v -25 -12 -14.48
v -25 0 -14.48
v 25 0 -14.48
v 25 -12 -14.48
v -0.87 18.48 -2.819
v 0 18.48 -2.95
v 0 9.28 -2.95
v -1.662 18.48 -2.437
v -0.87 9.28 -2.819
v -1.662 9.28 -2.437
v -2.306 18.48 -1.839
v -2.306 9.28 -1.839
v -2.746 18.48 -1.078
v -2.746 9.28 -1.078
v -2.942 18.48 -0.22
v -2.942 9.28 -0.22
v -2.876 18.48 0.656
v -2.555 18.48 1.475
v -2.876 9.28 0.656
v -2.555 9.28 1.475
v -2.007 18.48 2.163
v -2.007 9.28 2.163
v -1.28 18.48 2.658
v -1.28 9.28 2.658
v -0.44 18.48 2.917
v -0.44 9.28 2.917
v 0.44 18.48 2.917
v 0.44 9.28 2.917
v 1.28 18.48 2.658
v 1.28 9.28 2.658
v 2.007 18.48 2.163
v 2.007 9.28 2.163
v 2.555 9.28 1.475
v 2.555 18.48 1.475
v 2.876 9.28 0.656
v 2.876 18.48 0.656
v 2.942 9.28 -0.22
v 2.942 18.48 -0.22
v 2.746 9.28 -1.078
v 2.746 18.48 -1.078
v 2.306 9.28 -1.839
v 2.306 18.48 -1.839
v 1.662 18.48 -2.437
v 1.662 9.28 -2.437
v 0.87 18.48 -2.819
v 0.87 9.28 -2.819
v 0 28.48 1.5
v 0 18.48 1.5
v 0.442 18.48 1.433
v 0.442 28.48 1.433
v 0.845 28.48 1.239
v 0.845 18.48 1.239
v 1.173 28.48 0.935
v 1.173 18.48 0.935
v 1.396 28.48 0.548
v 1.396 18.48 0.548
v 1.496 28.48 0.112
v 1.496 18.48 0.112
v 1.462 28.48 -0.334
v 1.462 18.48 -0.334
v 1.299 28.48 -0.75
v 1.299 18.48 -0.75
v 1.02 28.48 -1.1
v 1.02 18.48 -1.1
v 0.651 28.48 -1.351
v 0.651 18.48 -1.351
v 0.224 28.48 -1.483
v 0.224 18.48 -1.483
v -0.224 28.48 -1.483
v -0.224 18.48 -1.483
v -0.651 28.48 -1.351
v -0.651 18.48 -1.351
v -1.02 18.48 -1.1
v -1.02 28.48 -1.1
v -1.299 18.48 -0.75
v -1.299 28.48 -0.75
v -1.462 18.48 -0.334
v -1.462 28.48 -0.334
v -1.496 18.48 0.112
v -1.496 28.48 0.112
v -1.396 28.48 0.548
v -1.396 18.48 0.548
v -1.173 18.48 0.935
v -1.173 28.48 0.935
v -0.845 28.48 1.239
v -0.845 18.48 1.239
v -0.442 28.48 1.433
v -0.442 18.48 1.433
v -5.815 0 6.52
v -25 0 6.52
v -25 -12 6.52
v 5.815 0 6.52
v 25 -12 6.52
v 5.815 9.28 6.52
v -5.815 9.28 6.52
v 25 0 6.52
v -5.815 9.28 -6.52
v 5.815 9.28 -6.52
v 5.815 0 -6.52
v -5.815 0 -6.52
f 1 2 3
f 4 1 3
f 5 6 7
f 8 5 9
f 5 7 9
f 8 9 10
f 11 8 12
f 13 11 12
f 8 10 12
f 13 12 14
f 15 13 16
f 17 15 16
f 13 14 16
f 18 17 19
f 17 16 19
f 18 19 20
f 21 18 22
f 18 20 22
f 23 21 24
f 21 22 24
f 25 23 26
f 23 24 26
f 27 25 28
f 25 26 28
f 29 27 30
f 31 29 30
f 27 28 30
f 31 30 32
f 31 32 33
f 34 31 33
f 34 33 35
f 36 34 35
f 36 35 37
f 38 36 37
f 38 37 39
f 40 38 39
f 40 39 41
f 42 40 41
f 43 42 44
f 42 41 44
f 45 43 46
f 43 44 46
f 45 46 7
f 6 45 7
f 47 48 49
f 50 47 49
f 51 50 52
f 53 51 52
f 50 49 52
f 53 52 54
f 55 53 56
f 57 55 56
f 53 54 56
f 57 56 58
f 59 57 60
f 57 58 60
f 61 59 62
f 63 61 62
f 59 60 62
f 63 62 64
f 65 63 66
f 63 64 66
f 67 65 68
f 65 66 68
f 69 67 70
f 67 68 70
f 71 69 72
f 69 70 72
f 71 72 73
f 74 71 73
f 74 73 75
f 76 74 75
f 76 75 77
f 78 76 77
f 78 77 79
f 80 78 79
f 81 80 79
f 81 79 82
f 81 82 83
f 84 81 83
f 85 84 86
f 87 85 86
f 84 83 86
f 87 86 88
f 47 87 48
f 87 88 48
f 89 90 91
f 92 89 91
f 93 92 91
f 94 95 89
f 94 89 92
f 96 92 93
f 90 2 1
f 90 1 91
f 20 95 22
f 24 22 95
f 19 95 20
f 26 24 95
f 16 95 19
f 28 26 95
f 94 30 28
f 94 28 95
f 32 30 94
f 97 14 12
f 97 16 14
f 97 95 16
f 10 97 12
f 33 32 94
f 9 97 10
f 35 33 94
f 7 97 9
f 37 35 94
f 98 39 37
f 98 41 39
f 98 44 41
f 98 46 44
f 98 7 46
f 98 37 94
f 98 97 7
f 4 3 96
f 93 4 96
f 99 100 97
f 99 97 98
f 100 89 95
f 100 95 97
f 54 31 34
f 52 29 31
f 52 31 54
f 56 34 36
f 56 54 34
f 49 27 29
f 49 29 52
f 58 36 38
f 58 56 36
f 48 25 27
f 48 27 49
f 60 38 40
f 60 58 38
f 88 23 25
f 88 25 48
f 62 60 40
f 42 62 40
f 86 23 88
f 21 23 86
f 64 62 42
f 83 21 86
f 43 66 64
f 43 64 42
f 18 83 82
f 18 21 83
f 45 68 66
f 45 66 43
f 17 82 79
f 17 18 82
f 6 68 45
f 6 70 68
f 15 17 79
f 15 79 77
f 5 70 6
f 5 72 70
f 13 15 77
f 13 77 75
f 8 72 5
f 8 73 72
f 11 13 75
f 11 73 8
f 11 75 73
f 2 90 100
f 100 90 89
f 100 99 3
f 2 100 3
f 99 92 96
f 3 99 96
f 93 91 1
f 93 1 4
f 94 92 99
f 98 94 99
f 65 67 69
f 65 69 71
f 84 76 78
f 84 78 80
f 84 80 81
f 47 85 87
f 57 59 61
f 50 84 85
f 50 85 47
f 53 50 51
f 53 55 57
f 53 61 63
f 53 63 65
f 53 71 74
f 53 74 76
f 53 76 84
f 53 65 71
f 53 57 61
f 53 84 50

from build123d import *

# Parameters (mm, degrees)
SKETCH1_W           = 11.63
SKETCH1_H           = 13.04
BOSS_EXTRUDE1_DEPTH = 9.28
SKETCH2_W           = 50
SKETCH2_H           = 21
BOSS_EXTRUDE2_DEPTH = 12
SKETCH3_R           = 2.95
BOSS_EXTRUDE3_DEPTH = 9.2
SKETCH4_R           = 1.5
BOSS_EXTRUDE4_DEPTH = 10


with BuildPart() as part:
    # Sketch1 → Boss-Extrude1 (new body)
    with BuildSketch(Plane(origin=(0, 0, 0), x_dir=(1, 0, 0), z_dir=(0, 1, 0))):
        Rectangle(SKETCH1_W, SKETCH1_H)
    extrude(amount=BOSS_EXTRUDE1_DEPTH)

    # Sketch2 → Boss-Extrude2 (add)
    with BuildSketch(Plane.XZ):
        with Locations((0, -3.98)):
            Rectangle(SKETCH2_W, SKETCH2_H)
    extrude(amount=BOSS_EXTRUDE2_DEPTH)

    # Sketch3 → Boss-Extrude3 (add)
    with BuildSketch(Plane(origin=(0, 9.28, 0), x_dir=(1, 0, 0), z_dir=(0, 1, 0))):
        with Locations(Location((0, 0, 0), (0, 0, 90))):
            Circle(SKETCH3_R)
    extrude(amount=BOSS_EXTRUDE3_DEPTH)

    # Sketch4 → Boss-Extrude4 (add)
    with BuildSketch(Plane(origin=(0, 18.48, 0), x_dir=(1, 0, 0), z_dir=(0, 1, 0))):
        with Locations(Location((0, 0, 0), (0, 0, 270))):
            Circle(SKETCH4_R)
    extrude(amount=BOSS_EXTRUDE4_DEPTH)


solid = part.part
